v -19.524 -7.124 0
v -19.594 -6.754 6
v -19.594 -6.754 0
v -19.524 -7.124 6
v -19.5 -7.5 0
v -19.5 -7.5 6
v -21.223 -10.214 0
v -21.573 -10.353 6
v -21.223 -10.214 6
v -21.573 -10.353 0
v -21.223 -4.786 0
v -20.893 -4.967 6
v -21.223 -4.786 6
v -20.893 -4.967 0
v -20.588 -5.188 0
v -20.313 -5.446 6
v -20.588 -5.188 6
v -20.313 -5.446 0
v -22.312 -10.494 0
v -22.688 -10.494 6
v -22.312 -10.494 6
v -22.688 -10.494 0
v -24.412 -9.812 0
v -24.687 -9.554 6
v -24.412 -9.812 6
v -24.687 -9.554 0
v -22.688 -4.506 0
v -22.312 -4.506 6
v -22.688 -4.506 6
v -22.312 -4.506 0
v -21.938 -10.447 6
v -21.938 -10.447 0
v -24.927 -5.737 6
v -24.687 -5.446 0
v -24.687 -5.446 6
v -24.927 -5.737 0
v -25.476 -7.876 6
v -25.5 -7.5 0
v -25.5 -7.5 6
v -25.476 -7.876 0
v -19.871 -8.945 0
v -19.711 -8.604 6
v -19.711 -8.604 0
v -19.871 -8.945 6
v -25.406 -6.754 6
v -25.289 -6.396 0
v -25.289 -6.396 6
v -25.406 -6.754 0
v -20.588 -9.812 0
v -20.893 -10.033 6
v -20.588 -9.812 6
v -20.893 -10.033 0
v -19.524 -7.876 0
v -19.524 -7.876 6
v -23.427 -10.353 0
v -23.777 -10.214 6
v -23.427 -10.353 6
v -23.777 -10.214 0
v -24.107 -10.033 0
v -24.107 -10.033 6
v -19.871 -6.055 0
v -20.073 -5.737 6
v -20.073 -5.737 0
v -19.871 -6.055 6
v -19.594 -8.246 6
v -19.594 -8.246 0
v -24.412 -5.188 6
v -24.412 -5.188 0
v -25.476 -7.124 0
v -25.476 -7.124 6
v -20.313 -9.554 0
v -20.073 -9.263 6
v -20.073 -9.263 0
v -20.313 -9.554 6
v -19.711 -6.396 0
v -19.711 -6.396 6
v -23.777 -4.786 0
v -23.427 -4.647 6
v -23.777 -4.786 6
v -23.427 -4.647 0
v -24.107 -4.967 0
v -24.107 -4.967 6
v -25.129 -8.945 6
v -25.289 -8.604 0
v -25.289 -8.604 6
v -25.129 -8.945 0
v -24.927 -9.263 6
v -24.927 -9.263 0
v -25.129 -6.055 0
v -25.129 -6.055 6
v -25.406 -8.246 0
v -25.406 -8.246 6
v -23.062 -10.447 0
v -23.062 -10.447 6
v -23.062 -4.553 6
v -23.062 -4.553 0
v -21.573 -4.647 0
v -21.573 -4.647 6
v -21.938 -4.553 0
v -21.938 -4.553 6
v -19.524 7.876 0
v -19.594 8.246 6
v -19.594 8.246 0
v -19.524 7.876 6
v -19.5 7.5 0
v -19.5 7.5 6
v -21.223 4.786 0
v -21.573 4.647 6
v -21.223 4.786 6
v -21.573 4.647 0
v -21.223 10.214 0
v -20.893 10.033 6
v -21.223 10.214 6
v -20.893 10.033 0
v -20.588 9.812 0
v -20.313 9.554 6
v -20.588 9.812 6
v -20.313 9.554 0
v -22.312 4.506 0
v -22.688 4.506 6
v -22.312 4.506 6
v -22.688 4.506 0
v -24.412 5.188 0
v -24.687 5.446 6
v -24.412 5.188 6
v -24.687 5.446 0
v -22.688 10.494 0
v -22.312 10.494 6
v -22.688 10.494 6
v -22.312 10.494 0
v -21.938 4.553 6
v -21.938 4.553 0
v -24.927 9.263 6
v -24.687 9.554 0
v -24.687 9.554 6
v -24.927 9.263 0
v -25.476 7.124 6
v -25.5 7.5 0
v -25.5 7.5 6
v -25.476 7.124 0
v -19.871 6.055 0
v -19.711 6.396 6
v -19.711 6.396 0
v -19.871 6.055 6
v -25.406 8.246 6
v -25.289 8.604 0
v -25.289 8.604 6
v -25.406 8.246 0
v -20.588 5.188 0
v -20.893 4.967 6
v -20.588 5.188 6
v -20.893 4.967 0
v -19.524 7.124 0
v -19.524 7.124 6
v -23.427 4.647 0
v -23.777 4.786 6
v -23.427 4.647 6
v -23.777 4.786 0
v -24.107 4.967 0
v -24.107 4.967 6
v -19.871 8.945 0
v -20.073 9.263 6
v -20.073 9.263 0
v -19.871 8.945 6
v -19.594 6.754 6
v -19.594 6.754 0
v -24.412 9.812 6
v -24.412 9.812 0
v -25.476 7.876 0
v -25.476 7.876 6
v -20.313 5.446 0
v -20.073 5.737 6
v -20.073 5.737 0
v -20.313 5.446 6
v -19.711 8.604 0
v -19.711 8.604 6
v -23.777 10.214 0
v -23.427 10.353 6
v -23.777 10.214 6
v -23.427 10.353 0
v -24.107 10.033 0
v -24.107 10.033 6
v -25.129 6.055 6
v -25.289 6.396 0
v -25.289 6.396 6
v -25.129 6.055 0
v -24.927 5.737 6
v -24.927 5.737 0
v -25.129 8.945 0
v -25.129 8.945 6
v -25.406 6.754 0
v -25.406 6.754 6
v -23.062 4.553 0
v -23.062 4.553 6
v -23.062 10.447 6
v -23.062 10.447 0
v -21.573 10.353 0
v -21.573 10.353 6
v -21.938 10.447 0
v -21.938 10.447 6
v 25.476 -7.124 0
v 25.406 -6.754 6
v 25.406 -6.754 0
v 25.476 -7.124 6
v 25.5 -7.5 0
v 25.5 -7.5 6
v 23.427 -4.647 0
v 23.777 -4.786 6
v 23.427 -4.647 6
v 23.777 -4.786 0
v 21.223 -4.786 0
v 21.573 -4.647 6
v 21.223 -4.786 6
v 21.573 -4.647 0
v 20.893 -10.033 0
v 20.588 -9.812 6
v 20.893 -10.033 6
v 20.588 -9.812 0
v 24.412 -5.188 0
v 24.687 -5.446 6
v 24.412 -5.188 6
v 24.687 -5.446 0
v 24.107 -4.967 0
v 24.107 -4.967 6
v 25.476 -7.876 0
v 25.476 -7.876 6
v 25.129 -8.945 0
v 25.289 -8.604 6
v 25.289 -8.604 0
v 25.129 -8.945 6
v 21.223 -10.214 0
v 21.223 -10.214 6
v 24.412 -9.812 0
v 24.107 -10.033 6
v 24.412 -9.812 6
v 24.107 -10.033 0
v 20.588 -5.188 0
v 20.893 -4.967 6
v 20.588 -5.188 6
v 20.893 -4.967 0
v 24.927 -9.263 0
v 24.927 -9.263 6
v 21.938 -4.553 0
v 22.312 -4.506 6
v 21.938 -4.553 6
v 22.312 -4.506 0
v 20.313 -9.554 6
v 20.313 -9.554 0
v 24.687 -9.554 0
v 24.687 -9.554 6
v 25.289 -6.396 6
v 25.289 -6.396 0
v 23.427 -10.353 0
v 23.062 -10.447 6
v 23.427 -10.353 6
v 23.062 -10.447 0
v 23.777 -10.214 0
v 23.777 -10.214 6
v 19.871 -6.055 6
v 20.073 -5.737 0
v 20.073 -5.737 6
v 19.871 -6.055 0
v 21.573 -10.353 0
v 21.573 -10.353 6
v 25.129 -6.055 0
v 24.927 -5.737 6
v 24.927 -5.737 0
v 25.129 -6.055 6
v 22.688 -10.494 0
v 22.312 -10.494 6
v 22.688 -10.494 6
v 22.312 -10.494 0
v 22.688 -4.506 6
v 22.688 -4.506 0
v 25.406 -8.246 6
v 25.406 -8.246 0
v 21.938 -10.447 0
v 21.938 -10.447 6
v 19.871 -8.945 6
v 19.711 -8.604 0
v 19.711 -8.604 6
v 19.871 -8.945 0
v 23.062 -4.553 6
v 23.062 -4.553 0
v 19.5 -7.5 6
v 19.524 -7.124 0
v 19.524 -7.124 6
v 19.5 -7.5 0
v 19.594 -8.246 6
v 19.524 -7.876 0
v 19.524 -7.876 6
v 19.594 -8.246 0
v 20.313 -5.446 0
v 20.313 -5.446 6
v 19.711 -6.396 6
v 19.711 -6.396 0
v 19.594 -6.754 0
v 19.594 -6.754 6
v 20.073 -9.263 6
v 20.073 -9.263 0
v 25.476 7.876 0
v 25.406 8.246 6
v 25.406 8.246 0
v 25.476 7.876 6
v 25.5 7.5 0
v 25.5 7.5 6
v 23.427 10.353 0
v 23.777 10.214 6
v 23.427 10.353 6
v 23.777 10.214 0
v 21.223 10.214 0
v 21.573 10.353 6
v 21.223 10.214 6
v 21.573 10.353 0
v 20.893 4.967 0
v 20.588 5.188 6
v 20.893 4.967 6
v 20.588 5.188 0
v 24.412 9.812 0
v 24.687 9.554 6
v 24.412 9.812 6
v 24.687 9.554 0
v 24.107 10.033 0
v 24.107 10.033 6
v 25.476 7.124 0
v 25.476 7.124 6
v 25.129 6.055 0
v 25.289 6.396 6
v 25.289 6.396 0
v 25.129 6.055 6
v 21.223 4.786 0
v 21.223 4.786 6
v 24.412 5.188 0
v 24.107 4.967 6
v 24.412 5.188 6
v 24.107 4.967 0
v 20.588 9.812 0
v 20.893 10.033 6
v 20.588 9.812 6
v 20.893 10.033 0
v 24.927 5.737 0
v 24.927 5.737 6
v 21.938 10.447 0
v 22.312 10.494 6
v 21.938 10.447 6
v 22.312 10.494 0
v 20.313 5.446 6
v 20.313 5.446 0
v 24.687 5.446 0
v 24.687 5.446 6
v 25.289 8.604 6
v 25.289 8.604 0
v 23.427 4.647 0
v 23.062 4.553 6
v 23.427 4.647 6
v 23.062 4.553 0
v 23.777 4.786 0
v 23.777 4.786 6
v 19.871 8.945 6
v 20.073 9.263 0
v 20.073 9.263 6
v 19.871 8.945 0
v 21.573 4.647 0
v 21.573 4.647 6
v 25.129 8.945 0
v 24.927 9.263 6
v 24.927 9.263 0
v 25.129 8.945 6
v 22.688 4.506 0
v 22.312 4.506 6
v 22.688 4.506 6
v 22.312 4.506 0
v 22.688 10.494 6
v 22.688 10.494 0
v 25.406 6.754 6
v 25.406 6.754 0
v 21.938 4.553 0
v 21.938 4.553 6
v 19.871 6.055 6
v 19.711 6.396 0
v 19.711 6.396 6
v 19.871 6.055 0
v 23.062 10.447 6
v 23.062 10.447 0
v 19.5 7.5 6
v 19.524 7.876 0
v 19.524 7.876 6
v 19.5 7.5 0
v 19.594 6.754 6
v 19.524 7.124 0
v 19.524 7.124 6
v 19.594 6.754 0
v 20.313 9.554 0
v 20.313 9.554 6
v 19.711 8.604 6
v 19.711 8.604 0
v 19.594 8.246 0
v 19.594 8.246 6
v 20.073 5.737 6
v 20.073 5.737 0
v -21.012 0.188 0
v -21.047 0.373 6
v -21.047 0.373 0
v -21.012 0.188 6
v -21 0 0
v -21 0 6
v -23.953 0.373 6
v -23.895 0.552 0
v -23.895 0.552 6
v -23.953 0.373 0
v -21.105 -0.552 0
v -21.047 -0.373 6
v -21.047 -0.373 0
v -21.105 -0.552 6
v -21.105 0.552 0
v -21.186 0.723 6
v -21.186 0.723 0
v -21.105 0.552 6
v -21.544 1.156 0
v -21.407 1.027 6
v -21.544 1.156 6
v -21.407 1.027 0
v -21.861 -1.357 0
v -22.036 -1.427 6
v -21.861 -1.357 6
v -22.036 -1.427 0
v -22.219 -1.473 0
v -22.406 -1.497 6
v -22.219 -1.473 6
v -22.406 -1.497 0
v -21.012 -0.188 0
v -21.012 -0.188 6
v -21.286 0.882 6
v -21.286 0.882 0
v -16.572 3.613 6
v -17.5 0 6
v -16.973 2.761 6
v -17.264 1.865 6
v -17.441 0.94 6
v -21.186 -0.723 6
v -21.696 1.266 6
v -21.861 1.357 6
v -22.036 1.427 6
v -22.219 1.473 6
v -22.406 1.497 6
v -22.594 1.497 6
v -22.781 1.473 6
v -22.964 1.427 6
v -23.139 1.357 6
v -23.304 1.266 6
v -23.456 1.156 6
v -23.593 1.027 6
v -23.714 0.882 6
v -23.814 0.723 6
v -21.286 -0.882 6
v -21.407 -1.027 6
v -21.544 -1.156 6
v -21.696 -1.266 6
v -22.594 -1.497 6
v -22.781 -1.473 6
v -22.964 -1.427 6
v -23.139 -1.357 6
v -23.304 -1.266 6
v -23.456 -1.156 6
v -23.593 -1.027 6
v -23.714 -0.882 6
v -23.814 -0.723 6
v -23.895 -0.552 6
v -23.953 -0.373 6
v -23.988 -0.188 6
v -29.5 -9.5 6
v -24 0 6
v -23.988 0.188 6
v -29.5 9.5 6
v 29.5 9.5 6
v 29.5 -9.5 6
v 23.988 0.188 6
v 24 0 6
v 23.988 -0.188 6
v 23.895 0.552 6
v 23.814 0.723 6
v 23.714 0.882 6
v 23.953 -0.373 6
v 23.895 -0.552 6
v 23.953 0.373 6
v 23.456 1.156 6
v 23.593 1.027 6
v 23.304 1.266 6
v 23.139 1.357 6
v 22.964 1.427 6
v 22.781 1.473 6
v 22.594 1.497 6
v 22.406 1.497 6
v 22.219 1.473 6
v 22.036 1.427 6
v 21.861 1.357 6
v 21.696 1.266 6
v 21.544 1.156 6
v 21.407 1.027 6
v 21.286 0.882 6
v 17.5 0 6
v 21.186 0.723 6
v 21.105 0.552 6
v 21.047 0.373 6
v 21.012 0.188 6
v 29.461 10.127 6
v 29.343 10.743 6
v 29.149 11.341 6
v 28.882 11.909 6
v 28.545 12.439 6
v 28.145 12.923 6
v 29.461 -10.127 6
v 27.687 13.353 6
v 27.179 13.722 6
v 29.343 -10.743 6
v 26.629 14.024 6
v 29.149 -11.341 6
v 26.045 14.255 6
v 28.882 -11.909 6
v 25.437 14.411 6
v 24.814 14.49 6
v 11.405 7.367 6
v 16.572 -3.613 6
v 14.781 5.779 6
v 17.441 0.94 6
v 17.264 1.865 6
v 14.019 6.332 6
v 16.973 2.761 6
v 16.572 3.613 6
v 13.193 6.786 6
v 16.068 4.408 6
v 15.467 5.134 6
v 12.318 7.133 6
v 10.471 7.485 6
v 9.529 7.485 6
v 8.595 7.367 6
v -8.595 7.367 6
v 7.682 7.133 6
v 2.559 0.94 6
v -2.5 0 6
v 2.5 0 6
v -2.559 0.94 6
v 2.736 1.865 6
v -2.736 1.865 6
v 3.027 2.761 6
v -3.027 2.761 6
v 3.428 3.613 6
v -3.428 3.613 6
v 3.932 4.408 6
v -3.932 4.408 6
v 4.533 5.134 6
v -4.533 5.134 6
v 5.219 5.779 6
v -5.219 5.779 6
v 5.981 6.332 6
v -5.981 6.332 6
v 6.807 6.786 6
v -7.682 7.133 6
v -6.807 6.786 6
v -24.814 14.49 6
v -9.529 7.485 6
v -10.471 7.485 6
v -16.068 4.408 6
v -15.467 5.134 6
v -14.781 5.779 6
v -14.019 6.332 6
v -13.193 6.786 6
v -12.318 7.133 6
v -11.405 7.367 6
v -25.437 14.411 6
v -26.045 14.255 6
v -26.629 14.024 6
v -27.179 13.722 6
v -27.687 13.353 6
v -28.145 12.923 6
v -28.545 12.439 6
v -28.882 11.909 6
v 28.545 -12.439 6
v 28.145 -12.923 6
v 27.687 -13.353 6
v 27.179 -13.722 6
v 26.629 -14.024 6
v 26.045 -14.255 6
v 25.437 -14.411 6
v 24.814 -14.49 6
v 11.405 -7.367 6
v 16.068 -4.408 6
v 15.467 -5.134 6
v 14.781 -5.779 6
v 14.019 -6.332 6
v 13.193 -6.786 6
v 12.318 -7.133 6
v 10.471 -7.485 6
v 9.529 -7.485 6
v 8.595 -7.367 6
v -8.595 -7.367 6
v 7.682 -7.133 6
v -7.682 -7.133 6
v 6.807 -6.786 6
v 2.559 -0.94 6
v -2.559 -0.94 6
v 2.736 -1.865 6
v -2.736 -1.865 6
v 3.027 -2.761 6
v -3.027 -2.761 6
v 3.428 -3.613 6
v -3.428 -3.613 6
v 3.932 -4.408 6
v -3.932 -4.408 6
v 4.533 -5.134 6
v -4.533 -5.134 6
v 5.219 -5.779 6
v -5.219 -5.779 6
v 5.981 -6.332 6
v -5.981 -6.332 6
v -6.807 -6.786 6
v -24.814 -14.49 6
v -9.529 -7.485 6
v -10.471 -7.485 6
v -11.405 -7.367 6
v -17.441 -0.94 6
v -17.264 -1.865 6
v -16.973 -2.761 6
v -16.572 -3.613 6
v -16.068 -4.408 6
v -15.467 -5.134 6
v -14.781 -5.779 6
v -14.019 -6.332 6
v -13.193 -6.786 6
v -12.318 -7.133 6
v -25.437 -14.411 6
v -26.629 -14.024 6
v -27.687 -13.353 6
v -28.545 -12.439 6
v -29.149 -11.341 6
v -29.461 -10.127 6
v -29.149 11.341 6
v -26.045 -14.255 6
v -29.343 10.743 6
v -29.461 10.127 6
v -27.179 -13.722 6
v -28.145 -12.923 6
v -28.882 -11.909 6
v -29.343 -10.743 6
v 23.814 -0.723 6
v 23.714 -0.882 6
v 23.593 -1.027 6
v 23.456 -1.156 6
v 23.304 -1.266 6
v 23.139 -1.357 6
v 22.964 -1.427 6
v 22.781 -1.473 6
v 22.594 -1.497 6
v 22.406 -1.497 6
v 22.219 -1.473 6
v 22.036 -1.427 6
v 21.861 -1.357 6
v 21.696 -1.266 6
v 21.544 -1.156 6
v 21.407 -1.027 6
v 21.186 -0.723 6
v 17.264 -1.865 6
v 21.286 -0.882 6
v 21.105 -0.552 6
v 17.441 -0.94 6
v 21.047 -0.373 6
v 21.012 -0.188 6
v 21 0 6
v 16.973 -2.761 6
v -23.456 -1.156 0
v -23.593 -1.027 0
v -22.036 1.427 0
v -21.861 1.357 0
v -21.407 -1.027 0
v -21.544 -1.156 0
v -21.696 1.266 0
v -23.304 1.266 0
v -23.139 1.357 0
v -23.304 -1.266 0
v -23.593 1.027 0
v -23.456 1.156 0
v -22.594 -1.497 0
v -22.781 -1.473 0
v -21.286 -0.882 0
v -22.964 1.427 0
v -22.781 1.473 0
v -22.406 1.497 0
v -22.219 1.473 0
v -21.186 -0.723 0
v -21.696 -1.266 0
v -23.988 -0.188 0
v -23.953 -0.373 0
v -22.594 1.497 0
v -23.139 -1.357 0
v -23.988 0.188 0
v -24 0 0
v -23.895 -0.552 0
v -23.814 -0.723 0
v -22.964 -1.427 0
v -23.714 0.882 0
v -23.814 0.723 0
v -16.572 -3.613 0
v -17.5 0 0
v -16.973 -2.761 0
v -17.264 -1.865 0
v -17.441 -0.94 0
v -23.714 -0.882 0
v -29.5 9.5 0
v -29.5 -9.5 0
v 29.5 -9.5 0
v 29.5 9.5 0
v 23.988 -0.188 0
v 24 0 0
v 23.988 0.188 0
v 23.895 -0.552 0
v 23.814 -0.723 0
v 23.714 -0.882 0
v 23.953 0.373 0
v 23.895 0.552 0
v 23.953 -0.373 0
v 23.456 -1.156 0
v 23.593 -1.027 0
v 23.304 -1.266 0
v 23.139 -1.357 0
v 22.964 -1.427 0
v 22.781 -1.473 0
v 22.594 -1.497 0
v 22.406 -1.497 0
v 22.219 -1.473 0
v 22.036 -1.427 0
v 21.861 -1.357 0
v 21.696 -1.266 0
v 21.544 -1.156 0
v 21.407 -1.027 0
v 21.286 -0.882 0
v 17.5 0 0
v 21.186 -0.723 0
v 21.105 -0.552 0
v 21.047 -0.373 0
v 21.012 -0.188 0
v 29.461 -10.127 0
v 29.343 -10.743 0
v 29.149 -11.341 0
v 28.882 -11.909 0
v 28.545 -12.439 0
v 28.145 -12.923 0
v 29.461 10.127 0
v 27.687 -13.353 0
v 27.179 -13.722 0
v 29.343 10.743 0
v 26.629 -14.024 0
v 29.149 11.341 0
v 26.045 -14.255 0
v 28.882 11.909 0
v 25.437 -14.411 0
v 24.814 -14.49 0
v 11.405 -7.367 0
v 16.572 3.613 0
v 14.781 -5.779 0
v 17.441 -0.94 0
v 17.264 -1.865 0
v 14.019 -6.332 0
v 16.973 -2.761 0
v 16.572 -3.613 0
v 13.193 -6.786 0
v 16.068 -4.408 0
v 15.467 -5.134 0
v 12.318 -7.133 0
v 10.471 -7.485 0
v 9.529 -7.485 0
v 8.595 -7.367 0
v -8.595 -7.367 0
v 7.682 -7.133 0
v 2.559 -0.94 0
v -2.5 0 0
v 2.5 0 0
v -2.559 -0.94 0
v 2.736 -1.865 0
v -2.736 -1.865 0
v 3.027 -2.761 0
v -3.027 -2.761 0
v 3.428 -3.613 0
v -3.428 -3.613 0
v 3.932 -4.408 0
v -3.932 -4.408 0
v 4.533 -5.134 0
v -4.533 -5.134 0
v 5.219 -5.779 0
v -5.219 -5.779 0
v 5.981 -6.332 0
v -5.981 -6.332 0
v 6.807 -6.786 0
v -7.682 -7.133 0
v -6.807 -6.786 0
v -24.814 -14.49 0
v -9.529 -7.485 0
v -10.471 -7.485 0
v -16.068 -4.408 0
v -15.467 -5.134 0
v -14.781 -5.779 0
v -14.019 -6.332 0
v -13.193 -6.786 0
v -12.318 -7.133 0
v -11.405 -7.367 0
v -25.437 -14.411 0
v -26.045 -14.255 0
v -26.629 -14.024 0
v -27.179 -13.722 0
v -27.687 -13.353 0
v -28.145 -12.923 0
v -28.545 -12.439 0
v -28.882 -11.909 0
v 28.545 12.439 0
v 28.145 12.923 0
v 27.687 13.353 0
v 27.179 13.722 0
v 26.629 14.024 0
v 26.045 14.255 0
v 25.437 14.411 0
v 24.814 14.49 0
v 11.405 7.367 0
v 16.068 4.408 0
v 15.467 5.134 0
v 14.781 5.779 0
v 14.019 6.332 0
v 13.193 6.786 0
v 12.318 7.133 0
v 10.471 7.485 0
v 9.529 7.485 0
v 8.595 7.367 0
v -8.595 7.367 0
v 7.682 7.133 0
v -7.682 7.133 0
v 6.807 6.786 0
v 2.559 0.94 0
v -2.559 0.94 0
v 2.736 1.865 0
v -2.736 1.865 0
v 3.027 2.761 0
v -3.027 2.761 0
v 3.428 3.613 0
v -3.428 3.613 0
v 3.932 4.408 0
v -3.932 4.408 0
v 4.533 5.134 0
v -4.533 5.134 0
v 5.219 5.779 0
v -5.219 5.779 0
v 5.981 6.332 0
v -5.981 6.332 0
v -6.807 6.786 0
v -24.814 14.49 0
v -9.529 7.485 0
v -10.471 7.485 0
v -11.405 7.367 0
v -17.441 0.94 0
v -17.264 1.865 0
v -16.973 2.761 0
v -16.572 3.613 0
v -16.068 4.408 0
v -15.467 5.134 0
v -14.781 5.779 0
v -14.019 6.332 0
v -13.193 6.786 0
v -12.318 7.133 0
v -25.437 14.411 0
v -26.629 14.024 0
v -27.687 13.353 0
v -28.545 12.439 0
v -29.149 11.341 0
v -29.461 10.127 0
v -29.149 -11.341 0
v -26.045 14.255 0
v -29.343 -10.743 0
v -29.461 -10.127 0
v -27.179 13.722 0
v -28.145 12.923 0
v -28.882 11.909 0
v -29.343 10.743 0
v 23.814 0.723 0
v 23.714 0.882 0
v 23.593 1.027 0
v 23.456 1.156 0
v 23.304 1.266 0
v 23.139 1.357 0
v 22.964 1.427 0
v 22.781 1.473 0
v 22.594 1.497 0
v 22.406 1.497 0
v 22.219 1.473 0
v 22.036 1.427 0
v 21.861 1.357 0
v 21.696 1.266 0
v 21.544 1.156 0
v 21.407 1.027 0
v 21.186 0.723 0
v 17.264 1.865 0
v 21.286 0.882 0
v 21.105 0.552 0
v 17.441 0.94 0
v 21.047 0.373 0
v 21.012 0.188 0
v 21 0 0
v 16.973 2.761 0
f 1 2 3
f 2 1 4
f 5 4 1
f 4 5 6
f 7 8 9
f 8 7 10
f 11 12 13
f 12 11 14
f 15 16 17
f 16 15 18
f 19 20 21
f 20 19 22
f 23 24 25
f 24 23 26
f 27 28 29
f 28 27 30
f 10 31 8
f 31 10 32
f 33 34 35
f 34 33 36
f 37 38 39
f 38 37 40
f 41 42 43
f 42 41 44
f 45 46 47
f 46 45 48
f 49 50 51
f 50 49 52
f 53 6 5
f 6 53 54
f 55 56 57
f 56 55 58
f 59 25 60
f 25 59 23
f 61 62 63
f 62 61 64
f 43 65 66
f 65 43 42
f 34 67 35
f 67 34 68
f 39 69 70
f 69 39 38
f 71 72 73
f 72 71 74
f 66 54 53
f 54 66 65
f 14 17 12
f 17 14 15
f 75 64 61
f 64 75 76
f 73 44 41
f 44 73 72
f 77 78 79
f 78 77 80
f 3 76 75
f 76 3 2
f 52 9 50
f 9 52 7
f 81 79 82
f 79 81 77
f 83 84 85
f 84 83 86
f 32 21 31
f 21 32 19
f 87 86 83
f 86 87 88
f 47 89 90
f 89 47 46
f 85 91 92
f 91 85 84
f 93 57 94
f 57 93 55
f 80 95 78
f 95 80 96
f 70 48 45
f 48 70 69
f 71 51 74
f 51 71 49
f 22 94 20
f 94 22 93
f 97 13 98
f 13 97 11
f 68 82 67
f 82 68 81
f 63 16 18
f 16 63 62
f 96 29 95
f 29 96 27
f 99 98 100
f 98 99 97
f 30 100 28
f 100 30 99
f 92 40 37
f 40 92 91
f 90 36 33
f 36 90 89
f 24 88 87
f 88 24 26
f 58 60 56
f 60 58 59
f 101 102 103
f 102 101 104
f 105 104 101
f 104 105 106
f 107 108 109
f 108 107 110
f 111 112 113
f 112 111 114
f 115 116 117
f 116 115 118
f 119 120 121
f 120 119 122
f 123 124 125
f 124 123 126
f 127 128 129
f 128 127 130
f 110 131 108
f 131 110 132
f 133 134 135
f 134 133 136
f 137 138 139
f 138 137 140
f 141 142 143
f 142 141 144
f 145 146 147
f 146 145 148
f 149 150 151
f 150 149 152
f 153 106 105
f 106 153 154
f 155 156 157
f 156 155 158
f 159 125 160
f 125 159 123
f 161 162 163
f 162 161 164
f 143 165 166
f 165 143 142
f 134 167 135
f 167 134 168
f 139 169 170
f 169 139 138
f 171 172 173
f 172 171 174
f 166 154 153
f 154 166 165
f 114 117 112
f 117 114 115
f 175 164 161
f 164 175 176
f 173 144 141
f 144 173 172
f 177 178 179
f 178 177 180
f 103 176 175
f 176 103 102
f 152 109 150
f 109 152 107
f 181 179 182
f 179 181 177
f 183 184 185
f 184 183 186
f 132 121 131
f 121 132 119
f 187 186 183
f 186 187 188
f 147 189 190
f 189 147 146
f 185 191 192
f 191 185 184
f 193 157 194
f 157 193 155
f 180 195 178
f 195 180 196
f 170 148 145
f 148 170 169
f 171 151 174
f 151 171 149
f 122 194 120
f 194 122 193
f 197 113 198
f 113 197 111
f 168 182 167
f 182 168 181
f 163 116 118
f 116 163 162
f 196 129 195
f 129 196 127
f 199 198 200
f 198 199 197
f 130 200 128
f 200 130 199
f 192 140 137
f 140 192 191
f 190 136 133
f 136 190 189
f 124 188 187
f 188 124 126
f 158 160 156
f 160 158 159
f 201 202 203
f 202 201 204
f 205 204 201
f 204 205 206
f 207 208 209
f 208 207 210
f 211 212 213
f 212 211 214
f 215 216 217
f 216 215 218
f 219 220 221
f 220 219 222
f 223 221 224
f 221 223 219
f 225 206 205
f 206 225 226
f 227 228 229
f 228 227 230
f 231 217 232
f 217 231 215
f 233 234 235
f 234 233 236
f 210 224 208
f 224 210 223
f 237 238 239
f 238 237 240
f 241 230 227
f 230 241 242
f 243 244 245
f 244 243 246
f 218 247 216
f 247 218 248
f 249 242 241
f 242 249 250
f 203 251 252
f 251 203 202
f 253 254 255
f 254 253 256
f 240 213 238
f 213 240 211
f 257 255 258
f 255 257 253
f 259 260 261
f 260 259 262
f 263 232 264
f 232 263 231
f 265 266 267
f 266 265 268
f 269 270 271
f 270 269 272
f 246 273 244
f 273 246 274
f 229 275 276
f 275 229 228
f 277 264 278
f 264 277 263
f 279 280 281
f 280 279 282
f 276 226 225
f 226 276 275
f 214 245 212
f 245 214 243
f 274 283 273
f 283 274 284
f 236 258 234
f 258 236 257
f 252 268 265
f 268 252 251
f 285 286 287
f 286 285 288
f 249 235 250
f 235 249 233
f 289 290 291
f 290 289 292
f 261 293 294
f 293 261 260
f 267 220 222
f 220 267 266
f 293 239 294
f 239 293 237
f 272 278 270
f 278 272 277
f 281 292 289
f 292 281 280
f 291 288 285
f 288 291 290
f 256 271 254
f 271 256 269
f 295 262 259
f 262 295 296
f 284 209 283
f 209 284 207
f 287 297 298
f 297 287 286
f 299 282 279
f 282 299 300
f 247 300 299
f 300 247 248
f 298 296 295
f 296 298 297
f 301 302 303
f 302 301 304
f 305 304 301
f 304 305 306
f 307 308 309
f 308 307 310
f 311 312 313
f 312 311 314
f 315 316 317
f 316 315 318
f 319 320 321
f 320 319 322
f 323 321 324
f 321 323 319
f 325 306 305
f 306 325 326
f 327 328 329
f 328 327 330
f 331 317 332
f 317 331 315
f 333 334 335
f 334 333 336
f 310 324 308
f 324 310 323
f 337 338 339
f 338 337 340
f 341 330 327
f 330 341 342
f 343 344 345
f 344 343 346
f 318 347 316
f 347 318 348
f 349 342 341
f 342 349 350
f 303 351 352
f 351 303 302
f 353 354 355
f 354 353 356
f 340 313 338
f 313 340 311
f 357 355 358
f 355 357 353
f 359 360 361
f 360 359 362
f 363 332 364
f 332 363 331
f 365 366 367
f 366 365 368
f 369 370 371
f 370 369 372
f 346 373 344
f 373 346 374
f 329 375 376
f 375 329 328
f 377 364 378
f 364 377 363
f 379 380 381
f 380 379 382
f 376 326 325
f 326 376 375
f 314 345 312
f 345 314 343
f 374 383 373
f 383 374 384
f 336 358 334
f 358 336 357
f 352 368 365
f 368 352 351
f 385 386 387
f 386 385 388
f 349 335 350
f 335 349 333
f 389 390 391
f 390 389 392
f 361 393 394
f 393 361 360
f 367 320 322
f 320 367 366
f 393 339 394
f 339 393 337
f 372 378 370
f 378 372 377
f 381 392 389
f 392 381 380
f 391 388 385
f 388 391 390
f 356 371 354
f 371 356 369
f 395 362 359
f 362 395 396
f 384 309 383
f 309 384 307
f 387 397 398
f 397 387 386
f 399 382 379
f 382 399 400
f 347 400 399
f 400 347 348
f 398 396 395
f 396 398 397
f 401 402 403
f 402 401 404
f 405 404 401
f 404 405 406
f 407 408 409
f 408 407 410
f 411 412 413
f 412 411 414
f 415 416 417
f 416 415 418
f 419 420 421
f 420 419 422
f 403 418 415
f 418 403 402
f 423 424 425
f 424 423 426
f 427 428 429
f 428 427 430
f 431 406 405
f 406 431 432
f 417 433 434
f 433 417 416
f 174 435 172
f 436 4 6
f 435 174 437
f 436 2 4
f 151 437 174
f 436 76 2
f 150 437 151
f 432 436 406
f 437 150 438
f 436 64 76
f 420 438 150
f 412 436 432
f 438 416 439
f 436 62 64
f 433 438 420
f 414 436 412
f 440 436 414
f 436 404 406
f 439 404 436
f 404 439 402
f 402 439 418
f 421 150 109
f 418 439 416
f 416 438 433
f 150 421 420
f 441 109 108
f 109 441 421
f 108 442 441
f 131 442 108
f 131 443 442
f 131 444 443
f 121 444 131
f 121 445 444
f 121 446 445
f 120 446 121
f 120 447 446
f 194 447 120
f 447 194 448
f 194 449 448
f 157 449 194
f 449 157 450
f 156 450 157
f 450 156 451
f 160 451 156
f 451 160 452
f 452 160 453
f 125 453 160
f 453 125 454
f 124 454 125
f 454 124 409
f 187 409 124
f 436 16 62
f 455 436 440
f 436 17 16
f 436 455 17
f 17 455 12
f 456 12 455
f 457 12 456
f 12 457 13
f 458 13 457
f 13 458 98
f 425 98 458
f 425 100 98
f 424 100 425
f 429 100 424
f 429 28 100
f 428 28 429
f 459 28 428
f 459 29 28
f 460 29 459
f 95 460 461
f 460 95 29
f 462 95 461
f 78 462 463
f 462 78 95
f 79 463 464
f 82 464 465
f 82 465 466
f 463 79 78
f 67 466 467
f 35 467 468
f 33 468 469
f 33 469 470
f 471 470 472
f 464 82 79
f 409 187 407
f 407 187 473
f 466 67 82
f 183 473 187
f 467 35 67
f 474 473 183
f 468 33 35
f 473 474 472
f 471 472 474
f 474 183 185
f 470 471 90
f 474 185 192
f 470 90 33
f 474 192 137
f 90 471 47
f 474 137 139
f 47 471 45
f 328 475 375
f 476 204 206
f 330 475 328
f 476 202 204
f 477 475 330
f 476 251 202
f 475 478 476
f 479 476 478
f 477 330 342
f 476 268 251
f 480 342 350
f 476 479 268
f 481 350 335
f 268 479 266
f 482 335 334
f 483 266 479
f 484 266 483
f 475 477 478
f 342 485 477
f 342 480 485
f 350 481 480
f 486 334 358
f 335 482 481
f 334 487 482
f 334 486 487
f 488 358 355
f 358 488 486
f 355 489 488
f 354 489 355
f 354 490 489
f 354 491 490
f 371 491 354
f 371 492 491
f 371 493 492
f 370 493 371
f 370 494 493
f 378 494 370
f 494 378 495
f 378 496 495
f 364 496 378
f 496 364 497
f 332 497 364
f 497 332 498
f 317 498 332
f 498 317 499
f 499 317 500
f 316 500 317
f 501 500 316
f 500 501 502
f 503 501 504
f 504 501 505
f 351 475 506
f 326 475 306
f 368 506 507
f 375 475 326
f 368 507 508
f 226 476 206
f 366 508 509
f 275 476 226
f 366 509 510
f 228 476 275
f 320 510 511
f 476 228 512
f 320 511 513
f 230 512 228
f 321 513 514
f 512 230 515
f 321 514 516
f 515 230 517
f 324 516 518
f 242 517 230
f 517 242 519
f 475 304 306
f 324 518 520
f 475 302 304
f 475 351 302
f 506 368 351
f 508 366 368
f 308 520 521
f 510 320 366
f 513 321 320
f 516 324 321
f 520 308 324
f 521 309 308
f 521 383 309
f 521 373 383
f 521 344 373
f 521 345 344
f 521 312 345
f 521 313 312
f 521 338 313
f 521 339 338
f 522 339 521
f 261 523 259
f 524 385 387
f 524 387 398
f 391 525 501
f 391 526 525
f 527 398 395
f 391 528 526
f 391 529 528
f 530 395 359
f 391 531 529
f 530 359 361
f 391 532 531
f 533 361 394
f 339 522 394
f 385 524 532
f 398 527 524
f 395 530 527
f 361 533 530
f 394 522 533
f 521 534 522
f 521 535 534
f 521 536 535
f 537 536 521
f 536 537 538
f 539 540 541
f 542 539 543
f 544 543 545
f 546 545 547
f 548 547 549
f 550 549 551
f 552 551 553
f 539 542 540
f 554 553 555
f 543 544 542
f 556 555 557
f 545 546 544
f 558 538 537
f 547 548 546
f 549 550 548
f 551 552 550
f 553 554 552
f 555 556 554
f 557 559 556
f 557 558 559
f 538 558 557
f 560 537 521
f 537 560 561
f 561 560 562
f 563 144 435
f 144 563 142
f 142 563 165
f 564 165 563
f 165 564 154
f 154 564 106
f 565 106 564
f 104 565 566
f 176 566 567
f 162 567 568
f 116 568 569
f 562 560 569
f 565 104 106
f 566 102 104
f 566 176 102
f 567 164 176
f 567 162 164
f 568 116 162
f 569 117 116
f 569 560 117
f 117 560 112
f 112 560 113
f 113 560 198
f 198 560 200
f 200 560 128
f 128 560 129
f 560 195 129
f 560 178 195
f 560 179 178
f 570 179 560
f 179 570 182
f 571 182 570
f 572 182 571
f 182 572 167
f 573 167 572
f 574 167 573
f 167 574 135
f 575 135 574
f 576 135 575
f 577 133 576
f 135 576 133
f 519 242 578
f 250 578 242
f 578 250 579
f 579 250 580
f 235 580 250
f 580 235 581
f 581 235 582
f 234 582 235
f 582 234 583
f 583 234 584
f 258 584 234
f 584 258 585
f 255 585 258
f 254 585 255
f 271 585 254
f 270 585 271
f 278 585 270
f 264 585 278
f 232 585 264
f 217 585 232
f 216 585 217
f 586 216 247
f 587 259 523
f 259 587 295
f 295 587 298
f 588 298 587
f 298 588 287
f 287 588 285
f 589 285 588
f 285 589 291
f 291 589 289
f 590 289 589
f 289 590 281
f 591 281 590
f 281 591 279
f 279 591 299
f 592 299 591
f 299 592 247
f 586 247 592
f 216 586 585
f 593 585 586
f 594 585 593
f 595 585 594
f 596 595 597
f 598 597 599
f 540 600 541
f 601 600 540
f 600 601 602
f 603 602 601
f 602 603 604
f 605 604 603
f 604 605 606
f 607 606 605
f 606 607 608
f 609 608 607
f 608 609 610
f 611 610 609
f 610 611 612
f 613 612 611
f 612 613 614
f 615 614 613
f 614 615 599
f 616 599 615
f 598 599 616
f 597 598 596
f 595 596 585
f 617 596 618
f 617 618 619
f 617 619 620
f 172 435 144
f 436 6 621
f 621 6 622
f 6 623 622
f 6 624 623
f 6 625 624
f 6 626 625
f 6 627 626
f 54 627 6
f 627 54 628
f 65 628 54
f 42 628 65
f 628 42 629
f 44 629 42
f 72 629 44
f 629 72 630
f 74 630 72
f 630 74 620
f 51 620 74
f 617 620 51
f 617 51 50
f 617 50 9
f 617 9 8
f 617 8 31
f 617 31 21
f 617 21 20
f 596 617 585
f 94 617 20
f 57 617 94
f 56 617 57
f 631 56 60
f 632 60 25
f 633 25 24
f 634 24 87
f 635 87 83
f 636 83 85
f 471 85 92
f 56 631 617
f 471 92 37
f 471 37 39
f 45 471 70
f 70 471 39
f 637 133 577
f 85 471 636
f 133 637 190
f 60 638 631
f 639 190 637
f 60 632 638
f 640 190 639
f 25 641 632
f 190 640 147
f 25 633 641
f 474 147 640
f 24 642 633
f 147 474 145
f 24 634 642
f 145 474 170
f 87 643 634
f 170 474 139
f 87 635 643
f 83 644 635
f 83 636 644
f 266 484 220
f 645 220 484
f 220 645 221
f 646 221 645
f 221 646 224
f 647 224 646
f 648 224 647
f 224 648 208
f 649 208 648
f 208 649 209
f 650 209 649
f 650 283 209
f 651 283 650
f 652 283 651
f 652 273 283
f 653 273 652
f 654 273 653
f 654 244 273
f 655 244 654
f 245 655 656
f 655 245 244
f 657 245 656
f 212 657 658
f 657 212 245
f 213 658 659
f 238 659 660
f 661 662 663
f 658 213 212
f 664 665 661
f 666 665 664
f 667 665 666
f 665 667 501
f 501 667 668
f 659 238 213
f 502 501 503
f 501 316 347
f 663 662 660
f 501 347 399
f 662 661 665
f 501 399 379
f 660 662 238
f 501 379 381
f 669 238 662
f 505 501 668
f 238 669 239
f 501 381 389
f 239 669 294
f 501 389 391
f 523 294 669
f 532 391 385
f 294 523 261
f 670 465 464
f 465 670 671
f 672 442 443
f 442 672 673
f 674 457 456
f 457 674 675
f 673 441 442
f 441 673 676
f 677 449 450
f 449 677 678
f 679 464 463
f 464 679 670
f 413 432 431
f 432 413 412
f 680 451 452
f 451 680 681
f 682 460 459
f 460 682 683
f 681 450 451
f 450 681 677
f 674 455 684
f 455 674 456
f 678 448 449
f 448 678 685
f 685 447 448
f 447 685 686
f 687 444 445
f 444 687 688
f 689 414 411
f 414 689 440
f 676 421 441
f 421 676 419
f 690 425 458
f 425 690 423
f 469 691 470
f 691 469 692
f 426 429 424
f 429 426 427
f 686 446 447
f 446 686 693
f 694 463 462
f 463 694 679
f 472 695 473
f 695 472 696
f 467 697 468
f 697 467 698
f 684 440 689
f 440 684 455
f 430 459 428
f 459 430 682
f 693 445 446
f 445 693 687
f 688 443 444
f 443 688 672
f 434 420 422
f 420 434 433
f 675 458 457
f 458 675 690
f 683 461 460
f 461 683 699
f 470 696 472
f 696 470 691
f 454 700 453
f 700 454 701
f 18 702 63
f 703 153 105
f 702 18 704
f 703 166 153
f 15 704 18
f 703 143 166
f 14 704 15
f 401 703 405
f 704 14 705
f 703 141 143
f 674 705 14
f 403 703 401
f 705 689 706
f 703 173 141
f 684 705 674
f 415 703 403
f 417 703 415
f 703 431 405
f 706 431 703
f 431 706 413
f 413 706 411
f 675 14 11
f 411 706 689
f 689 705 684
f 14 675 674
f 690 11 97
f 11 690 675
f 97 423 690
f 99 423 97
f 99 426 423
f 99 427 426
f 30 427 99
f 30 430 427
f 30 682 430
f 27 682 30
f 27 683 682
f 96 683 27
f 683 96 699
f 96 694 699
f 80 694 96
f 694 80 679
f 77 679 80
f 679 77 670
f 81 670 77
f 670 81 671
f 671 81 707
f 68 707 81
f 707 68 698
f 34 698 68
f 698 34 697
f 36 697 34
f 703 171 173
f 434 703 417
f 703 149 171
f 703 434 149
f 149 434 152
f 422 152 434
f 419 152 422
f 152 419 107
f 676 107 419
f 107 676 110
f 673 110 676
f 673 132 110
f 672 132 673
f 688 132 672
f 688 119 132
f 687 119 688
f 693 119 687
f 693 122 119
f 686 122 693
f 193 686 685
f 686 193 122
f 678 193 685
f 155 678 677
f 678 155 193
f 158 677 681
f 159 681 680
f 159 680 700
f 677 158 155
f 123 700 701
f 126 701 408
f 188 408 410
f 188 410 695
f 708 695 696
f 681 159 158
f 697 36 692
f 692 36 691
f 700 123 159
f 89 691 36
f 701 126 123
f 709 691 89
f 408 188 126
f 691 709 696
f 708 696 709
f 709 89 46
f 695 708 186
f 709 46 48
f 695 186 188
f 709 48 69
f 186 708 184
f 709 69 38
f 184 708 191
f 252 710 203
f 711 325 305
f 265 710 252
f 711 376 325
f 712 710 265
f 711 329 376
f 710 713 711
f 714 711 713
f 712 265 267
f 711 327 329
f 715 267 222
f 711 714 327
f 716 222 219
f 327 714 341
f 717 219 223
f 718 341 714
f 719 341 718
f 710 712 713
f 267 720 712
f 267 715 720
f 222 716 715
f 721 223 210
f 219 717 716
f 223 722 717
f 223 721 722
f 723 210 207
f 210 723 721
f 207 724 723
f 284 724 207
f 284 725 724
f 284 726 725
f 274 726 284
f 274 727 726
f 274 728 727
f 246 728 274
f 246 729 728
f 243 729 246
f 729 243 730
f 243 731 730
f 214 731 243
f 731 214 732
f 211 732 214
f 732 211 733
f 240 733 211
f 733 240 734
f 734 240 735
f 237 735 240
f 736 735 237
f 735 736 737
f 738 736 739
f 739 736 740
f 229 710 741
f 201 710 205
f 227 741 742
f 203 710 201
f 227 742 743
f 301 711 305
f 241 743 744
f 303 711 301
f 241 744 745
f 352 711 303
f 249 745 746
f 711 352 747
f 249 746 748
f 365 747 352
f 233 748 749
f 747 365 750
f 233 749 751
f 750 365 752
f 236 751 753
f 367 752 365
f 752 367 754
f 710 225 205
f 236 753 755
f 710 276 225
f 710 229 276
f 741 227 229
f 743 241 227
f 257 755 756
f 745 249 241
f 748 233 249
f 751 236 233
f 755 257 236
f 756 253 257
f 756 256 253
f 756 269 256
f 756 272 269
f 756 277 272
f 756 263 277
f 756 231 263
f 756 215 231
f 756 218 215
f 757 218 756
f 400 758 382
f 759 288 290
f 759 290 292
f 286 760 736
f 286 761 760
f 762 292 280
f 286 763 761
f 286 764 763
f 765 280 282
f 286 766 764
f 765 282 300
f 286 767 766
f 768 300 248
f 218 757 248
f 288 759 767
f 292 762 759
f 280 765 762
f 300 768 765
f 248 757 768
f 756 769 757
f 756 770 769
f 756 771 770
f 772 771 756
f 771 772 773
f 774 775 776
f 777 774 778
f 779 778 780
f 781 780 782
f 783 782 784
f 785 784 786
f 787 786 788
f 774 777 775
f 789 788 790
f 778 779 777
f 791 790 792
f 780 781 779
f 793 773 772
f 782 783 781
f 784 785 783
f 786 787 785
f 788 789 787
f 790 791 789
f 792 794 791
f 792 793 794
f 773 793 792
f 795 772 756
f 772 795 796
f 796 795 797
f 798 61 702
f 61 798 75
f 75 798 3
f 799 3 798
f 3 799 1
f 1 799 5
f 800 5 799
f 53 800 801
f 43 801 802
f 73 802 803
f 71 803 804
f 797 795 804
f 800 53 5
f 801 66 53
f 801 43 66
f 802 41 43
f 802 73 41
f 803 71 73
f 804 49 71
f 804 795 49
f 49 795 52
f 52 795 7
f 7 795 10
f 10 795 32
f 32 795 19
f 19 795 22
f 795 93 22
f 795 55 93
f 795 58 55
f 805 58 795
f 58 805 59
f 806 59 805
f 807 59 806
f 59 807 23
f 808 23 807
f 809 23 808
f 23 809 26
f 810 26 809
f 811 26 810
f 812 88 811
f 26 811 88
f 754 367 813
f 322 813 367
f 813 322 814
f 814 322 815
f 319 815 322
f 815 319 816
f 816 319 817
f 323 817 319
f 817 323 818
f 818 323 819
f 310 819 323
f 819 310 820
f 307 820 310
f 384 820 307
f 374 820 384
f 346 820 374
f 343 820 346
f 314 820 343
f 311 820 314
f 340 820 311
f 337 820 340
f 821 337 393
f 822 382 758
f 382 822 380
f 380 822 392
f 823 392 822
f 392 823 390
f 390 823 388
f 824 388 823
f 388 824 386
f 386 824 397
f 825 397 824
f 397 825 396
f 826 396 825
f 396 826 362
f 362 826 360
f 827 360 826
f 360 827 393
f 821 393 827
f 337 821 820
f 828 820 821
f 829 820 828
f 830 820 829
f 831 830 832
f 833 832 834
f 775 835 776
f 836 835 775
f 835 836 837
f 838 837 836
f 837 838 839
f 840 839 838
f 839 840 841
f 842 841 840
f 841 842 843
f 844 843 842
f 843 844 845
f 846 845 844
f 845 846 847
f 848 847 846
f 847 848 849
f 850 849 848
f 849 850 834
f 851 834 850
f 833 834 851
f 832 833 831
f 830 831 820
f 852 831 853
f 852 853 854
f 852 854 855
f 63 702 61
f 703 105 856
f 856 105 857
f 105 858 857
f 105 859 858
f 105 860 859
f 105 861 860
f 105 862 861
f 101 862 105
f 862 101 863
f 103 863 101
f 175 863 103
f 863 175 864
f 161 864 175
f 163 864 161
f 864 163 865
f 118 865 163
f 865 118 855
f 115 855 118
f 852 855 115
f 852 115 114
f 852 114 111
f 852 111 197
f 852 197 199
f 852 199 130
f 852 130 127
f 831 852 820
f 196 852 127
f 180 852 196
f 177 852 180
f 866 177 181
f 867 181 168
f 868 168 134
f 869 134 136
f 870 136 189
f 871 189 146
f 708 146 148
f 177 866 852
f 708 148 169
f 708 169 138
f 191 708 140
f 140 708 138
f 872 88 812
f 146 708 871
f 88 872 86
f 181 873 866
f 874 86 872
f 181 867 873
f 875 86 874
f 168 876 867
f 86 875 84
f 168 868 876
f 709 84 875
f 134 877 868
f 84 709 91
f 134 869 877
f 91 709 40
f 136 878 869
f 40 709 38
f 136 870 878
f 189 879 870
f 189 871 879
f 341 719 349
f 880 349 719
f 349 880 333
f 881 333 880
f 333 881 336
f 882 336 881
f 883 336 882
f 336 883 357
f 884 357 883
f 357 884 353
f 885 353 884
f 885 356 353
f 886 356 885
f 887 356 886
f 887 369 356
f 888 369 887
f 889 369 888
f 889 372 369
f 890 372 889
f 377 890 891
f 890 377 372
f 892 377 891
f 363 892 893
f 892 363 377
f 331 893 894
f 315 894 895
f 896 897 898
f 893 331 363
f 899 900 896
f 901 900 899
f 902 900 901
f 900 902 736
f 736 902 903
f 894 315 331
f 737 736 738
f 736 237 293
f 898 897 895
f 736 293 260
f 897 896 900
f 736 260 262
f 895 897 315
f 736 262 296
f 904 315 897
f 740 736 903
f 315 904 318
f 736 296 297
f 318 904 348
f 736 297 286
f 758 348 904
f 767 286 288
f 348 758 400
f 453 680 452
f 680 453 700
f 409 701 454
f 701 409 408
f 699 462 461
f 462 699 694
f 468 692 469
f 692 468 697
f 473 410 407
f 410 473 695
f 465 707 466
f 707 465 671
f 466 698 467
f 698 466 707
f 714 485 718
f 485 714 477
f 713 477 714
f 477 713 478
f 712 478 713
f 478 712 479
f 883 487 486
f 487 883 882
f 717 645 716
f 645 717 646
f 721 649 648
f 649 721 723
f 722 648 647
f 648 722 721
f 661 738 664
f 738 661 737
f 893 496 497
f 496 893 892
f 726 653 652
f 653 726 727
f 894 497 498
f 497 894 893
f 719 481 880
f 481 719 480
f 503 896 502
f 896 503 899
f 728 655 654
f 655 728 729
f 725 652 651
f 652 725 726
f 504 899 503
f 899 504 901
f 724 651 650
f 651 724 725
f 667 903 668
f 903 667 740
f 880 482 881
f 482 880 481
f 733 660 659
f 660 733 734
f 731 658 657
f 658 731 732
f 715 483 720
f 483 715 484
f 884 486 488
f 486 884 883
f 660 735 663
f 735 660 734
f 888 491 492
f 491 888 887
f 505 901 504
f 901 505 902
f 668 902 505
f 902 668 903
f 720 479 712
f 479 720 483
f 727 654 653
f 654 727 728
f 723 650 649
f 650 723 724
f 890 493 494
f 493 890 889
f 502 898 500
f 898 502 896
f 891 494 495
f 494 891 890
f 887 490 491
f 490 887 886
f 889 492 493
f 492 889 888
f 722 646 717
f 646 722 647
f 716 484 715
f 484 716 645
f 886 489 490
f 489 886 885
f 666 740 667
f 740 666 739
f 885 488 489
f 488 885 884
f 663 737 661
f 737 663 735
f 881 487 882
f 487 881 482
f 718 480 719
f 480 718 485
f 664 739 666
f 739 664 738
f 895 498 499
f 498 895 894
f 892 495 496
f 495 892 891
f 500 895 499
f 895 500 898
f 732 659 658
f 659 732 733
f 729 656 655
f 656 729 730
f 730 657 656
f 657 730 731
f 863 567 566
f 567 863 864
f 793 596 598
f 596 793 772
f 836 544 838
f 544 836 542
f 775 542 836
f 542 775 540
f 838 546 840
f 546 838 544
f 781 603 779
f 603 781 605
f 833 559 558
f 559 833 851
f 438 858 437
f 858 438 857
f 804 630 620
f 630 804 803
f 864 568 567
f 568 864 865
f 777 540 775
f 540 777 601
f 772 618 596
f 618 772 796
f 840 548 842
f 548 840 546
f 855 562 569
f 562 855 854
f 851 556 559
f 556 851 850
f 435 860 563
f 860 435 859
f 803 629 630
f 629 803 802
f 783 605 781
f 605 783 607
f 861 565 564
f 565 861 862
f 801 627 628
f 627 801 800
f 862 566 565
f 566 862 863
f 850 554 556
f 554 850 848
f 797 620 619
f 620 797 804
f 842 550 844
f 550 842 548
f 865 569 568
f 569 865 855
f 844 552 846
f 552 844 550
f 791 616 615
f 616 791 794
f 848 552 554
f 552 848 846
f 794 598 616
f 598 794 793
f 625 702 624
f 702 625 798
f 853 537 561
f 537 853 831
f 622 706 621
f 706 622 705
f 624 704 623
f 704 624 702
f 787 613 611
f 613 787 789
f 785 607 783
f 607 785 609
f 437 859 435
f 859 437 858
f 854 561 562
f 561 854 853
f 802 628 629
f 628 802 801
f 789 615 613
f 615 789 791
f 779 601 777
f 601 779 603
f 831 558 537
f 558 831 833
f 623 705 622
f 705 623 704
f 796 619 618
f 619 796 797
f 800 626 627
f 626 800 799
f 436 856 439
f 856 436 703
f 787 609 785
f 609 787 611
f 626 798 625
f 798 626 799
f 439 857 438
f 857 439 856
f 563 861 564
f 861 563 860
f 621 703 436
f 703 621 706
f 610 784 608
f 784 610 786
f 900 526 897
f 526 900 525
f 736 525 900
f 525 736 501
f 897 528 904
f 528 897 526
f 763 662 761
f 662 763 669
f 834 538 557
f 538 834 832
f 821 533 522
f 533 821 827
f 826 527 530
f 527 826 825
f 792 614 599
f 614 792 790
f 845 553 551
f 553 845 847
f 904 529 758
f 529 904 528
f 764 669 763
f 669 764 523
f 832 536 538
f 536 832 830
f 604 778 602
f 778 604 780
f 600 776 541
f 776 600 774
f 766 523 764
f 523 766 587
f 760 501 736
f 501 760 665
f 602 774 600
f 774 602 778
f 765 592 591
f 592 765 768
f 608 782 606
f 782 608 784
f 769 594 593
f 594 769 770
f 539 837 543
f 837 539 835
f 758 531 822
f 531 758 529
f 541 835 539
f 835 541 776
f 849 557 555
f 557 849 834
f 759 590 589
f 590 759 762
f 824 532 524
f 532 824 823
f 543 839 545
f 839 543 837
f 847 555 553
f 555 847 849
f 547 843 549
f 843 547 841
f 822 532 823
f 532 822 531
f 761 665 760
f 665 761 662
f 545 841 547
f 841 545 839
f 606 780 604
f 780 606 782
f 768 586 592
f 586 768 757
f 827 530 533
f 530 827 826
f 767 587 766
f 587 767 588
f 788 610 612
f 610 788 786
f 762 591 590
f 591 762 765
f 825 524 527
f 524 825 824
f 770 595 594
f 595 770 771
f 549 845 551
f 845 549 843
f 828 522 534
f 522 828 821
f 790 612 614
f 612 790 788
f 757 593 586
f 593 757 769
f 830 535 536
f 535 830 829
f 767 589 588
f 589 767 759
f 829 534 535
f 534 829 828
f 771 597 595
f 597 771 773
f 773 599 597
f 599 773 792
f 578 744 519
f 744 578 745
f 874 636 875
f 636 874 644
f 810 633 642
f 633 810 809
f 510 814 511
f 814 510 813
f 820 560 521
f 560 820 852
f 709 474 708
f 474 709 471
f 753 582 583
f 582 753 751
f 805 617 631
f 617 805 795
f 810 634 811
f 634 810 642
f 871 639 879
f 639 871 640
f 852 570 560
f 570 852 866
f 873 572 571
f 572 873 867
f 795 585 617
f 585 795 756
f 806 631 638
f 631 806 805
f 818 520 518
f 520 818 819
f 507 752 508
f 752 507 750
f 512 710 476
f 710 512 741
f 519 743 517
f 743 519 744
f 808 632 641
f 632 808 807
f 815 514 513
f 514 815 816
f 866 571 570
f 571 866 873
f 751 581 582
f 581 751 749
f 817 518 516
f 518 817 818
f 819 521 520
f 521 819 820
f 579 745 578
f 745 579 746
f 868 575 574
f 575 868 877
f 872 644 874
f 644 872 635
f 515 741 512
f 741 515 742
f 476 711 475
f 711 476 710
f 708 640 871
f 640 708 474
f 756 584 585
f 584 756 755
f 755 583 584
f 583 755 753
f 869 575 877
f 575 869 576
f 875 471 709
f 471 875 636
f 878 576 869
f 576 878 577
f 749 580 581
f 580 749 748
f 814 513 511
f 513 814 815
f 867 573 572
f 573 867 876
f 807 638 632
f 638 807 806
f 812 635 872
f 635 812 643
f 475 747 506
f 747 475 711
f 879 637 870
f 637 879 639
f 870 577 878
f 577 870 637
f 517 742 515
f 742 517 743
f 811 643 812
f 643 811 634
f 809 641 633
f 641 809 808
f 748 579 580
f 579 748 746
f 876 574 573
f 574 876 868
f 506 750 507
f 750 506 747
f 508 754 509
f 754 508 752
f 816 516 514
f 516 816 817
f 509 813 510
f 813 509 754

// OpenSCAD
$fn = 50;


difference() {
	union() {
		hull() {
			translate(v = [-24.5000000000, 9.5000000000, 0]) {
				cylinder(h = 6, r = 5);
			}
			translate(v = [24.5000000000, 9.5000000000, 0]) {
				cylinder(h = 6, r = 5);
			}
			translate(v = [-24.5000000000, -9.5000000000, 0]) {
				cylinder(h = 6, r = 5);
			}
			translate(v = [24.5000000000, -9.5000000000, 0]) {
				cylinder(h = 6, r = 5);
			}
		}
	}
	union() {
		#translate(v = [-22.5000000000, -7.5000000000, 0]) {
			cylinder(h = 6, r = 3.0000000000);
		}
		#translate(v = [-22.5000000000, 7.5000000000, 0]) {
			cylinder(h = 6, r = 3.0000000000);
		}
		#translate(v = [22.5000000000, -7.5000000000, 0]) {
			cylinder(h = 6, r = 3.0000000000);
		}
		#translate(v = [22.5000000000, 7.5000000000, 0]) {
			cylinder(h = 6, r = 3.0000000000);
		}
		#translate(v = [-22.5000000000, -7.5000000000, -100.0000000000]) {
			cylinder(h = 200, r = 3.0000000000);
		}
		#translate(v = [-22.5000000000, 7.5000000000, -100.0000000000]) {
			cylinder(h = 200, r = 3.0000000000);
		}
		#translate(v = [22.5000000000, -7.5000000000, -100.0000000000]) {
			cylinder(h = 200, r = 3.0000000000);
		}
		#translate(v = [22.5000000000, 7.5000000000, -100.0000000000]) {
			cylinder(h = 200, r = 3.0000000000);
		}
		#translate(v = [-22.5000000000, -7.5000000000, 0]) {
			cylinder(h = 6, r = 1.5000000000);
		}
		#translate(v = [-22.5000000000, 0.0000000000, 0]) {
			cylinder(h = 6, r = 1.5000000000);
		}
		#translate(v = [-22.5000000000, 7.5000000000, 0]) {
			cylinder(h = 6, r = 1.5000000000);
		}
		#translate(v = [22.5000000000, -7.5000000000, 0]) {
			cylinder(h = 6, r = 1.5000000000);
		}
		#translate(v = [22.5000000000, 0.0000000000, 0]) {
			cylinder(h = 6, r = 1.5000000000);
		}
		#translate(v = [22.5000000000, 7.5000000000, 0]) {
			cylinder(h = 6, r = 1.5000000000);
		}
		#translate(v = [-22.5000000000, -7.5000000000, 0]) {
			cylinder(h = 6, r = 1.5000000000);
		}
		#translate(v = [-22.5000000000, 0.0000000000, 0]) {
			cylinder(h = 6, r = 1.5000000000);
		}
		#translate(v = [-22.5000000000, 7.5000000000, 0]) {
			cylinder(h = 6, r = 1.5000000000);
		}
		#translate(v = [22.5000000000, -7.5000000000, 0]) {
			cylinder(h = 6, r = 1.5000000000);
		}
		#translate(v = [22.5000000000, 0.0000000000, 0]) {
			cylinder(h = 6, r = 1.5000000000);
		}
		#translate(v = [22.5000000000, 7.5000000000, 0]) {
			cylinder(h = 6, r = 1.5000000000);
		}
		#translate(v = [-22.5000000000, -7.5000000000, 0]) {
			cylinder(h = 6, r = 1.5000000000);
		}
		#translate(v = [-22.5000000000, 0.0000000000, 0]) {
			cylinder(h = 6, r = 1.5000000000);
		}
		#translate(v = [-22.5000000000, 7.5000000000, 0]) {
			cylinder(h = 6, r = 1.5000000000);
		}
		#translate(v = [22.5000000000, -7.5000000000, 0]) {
			cylinder(h = 6, r = 1.5000000000);
		}
		#translate(v = [22.5000000000, 0.0000000000, 0]) {
			cylinder(h = 6, r = 1.5000000000);
		}
		#translate(v = [22.5000000000, 7.5000000000, 0]) {
			cylinder(h = 6, r = 1.5000000000);
		}
		#translate(v = [-10.0000000000, 0, 0]) {
			cylinder(h = 6, r = 7.5000000000);
		}
		#translate(v = [10.0000000000, 0, 0]) {
			cylinder(h = 6, r = 7.5000000000);
		}
	}
}
